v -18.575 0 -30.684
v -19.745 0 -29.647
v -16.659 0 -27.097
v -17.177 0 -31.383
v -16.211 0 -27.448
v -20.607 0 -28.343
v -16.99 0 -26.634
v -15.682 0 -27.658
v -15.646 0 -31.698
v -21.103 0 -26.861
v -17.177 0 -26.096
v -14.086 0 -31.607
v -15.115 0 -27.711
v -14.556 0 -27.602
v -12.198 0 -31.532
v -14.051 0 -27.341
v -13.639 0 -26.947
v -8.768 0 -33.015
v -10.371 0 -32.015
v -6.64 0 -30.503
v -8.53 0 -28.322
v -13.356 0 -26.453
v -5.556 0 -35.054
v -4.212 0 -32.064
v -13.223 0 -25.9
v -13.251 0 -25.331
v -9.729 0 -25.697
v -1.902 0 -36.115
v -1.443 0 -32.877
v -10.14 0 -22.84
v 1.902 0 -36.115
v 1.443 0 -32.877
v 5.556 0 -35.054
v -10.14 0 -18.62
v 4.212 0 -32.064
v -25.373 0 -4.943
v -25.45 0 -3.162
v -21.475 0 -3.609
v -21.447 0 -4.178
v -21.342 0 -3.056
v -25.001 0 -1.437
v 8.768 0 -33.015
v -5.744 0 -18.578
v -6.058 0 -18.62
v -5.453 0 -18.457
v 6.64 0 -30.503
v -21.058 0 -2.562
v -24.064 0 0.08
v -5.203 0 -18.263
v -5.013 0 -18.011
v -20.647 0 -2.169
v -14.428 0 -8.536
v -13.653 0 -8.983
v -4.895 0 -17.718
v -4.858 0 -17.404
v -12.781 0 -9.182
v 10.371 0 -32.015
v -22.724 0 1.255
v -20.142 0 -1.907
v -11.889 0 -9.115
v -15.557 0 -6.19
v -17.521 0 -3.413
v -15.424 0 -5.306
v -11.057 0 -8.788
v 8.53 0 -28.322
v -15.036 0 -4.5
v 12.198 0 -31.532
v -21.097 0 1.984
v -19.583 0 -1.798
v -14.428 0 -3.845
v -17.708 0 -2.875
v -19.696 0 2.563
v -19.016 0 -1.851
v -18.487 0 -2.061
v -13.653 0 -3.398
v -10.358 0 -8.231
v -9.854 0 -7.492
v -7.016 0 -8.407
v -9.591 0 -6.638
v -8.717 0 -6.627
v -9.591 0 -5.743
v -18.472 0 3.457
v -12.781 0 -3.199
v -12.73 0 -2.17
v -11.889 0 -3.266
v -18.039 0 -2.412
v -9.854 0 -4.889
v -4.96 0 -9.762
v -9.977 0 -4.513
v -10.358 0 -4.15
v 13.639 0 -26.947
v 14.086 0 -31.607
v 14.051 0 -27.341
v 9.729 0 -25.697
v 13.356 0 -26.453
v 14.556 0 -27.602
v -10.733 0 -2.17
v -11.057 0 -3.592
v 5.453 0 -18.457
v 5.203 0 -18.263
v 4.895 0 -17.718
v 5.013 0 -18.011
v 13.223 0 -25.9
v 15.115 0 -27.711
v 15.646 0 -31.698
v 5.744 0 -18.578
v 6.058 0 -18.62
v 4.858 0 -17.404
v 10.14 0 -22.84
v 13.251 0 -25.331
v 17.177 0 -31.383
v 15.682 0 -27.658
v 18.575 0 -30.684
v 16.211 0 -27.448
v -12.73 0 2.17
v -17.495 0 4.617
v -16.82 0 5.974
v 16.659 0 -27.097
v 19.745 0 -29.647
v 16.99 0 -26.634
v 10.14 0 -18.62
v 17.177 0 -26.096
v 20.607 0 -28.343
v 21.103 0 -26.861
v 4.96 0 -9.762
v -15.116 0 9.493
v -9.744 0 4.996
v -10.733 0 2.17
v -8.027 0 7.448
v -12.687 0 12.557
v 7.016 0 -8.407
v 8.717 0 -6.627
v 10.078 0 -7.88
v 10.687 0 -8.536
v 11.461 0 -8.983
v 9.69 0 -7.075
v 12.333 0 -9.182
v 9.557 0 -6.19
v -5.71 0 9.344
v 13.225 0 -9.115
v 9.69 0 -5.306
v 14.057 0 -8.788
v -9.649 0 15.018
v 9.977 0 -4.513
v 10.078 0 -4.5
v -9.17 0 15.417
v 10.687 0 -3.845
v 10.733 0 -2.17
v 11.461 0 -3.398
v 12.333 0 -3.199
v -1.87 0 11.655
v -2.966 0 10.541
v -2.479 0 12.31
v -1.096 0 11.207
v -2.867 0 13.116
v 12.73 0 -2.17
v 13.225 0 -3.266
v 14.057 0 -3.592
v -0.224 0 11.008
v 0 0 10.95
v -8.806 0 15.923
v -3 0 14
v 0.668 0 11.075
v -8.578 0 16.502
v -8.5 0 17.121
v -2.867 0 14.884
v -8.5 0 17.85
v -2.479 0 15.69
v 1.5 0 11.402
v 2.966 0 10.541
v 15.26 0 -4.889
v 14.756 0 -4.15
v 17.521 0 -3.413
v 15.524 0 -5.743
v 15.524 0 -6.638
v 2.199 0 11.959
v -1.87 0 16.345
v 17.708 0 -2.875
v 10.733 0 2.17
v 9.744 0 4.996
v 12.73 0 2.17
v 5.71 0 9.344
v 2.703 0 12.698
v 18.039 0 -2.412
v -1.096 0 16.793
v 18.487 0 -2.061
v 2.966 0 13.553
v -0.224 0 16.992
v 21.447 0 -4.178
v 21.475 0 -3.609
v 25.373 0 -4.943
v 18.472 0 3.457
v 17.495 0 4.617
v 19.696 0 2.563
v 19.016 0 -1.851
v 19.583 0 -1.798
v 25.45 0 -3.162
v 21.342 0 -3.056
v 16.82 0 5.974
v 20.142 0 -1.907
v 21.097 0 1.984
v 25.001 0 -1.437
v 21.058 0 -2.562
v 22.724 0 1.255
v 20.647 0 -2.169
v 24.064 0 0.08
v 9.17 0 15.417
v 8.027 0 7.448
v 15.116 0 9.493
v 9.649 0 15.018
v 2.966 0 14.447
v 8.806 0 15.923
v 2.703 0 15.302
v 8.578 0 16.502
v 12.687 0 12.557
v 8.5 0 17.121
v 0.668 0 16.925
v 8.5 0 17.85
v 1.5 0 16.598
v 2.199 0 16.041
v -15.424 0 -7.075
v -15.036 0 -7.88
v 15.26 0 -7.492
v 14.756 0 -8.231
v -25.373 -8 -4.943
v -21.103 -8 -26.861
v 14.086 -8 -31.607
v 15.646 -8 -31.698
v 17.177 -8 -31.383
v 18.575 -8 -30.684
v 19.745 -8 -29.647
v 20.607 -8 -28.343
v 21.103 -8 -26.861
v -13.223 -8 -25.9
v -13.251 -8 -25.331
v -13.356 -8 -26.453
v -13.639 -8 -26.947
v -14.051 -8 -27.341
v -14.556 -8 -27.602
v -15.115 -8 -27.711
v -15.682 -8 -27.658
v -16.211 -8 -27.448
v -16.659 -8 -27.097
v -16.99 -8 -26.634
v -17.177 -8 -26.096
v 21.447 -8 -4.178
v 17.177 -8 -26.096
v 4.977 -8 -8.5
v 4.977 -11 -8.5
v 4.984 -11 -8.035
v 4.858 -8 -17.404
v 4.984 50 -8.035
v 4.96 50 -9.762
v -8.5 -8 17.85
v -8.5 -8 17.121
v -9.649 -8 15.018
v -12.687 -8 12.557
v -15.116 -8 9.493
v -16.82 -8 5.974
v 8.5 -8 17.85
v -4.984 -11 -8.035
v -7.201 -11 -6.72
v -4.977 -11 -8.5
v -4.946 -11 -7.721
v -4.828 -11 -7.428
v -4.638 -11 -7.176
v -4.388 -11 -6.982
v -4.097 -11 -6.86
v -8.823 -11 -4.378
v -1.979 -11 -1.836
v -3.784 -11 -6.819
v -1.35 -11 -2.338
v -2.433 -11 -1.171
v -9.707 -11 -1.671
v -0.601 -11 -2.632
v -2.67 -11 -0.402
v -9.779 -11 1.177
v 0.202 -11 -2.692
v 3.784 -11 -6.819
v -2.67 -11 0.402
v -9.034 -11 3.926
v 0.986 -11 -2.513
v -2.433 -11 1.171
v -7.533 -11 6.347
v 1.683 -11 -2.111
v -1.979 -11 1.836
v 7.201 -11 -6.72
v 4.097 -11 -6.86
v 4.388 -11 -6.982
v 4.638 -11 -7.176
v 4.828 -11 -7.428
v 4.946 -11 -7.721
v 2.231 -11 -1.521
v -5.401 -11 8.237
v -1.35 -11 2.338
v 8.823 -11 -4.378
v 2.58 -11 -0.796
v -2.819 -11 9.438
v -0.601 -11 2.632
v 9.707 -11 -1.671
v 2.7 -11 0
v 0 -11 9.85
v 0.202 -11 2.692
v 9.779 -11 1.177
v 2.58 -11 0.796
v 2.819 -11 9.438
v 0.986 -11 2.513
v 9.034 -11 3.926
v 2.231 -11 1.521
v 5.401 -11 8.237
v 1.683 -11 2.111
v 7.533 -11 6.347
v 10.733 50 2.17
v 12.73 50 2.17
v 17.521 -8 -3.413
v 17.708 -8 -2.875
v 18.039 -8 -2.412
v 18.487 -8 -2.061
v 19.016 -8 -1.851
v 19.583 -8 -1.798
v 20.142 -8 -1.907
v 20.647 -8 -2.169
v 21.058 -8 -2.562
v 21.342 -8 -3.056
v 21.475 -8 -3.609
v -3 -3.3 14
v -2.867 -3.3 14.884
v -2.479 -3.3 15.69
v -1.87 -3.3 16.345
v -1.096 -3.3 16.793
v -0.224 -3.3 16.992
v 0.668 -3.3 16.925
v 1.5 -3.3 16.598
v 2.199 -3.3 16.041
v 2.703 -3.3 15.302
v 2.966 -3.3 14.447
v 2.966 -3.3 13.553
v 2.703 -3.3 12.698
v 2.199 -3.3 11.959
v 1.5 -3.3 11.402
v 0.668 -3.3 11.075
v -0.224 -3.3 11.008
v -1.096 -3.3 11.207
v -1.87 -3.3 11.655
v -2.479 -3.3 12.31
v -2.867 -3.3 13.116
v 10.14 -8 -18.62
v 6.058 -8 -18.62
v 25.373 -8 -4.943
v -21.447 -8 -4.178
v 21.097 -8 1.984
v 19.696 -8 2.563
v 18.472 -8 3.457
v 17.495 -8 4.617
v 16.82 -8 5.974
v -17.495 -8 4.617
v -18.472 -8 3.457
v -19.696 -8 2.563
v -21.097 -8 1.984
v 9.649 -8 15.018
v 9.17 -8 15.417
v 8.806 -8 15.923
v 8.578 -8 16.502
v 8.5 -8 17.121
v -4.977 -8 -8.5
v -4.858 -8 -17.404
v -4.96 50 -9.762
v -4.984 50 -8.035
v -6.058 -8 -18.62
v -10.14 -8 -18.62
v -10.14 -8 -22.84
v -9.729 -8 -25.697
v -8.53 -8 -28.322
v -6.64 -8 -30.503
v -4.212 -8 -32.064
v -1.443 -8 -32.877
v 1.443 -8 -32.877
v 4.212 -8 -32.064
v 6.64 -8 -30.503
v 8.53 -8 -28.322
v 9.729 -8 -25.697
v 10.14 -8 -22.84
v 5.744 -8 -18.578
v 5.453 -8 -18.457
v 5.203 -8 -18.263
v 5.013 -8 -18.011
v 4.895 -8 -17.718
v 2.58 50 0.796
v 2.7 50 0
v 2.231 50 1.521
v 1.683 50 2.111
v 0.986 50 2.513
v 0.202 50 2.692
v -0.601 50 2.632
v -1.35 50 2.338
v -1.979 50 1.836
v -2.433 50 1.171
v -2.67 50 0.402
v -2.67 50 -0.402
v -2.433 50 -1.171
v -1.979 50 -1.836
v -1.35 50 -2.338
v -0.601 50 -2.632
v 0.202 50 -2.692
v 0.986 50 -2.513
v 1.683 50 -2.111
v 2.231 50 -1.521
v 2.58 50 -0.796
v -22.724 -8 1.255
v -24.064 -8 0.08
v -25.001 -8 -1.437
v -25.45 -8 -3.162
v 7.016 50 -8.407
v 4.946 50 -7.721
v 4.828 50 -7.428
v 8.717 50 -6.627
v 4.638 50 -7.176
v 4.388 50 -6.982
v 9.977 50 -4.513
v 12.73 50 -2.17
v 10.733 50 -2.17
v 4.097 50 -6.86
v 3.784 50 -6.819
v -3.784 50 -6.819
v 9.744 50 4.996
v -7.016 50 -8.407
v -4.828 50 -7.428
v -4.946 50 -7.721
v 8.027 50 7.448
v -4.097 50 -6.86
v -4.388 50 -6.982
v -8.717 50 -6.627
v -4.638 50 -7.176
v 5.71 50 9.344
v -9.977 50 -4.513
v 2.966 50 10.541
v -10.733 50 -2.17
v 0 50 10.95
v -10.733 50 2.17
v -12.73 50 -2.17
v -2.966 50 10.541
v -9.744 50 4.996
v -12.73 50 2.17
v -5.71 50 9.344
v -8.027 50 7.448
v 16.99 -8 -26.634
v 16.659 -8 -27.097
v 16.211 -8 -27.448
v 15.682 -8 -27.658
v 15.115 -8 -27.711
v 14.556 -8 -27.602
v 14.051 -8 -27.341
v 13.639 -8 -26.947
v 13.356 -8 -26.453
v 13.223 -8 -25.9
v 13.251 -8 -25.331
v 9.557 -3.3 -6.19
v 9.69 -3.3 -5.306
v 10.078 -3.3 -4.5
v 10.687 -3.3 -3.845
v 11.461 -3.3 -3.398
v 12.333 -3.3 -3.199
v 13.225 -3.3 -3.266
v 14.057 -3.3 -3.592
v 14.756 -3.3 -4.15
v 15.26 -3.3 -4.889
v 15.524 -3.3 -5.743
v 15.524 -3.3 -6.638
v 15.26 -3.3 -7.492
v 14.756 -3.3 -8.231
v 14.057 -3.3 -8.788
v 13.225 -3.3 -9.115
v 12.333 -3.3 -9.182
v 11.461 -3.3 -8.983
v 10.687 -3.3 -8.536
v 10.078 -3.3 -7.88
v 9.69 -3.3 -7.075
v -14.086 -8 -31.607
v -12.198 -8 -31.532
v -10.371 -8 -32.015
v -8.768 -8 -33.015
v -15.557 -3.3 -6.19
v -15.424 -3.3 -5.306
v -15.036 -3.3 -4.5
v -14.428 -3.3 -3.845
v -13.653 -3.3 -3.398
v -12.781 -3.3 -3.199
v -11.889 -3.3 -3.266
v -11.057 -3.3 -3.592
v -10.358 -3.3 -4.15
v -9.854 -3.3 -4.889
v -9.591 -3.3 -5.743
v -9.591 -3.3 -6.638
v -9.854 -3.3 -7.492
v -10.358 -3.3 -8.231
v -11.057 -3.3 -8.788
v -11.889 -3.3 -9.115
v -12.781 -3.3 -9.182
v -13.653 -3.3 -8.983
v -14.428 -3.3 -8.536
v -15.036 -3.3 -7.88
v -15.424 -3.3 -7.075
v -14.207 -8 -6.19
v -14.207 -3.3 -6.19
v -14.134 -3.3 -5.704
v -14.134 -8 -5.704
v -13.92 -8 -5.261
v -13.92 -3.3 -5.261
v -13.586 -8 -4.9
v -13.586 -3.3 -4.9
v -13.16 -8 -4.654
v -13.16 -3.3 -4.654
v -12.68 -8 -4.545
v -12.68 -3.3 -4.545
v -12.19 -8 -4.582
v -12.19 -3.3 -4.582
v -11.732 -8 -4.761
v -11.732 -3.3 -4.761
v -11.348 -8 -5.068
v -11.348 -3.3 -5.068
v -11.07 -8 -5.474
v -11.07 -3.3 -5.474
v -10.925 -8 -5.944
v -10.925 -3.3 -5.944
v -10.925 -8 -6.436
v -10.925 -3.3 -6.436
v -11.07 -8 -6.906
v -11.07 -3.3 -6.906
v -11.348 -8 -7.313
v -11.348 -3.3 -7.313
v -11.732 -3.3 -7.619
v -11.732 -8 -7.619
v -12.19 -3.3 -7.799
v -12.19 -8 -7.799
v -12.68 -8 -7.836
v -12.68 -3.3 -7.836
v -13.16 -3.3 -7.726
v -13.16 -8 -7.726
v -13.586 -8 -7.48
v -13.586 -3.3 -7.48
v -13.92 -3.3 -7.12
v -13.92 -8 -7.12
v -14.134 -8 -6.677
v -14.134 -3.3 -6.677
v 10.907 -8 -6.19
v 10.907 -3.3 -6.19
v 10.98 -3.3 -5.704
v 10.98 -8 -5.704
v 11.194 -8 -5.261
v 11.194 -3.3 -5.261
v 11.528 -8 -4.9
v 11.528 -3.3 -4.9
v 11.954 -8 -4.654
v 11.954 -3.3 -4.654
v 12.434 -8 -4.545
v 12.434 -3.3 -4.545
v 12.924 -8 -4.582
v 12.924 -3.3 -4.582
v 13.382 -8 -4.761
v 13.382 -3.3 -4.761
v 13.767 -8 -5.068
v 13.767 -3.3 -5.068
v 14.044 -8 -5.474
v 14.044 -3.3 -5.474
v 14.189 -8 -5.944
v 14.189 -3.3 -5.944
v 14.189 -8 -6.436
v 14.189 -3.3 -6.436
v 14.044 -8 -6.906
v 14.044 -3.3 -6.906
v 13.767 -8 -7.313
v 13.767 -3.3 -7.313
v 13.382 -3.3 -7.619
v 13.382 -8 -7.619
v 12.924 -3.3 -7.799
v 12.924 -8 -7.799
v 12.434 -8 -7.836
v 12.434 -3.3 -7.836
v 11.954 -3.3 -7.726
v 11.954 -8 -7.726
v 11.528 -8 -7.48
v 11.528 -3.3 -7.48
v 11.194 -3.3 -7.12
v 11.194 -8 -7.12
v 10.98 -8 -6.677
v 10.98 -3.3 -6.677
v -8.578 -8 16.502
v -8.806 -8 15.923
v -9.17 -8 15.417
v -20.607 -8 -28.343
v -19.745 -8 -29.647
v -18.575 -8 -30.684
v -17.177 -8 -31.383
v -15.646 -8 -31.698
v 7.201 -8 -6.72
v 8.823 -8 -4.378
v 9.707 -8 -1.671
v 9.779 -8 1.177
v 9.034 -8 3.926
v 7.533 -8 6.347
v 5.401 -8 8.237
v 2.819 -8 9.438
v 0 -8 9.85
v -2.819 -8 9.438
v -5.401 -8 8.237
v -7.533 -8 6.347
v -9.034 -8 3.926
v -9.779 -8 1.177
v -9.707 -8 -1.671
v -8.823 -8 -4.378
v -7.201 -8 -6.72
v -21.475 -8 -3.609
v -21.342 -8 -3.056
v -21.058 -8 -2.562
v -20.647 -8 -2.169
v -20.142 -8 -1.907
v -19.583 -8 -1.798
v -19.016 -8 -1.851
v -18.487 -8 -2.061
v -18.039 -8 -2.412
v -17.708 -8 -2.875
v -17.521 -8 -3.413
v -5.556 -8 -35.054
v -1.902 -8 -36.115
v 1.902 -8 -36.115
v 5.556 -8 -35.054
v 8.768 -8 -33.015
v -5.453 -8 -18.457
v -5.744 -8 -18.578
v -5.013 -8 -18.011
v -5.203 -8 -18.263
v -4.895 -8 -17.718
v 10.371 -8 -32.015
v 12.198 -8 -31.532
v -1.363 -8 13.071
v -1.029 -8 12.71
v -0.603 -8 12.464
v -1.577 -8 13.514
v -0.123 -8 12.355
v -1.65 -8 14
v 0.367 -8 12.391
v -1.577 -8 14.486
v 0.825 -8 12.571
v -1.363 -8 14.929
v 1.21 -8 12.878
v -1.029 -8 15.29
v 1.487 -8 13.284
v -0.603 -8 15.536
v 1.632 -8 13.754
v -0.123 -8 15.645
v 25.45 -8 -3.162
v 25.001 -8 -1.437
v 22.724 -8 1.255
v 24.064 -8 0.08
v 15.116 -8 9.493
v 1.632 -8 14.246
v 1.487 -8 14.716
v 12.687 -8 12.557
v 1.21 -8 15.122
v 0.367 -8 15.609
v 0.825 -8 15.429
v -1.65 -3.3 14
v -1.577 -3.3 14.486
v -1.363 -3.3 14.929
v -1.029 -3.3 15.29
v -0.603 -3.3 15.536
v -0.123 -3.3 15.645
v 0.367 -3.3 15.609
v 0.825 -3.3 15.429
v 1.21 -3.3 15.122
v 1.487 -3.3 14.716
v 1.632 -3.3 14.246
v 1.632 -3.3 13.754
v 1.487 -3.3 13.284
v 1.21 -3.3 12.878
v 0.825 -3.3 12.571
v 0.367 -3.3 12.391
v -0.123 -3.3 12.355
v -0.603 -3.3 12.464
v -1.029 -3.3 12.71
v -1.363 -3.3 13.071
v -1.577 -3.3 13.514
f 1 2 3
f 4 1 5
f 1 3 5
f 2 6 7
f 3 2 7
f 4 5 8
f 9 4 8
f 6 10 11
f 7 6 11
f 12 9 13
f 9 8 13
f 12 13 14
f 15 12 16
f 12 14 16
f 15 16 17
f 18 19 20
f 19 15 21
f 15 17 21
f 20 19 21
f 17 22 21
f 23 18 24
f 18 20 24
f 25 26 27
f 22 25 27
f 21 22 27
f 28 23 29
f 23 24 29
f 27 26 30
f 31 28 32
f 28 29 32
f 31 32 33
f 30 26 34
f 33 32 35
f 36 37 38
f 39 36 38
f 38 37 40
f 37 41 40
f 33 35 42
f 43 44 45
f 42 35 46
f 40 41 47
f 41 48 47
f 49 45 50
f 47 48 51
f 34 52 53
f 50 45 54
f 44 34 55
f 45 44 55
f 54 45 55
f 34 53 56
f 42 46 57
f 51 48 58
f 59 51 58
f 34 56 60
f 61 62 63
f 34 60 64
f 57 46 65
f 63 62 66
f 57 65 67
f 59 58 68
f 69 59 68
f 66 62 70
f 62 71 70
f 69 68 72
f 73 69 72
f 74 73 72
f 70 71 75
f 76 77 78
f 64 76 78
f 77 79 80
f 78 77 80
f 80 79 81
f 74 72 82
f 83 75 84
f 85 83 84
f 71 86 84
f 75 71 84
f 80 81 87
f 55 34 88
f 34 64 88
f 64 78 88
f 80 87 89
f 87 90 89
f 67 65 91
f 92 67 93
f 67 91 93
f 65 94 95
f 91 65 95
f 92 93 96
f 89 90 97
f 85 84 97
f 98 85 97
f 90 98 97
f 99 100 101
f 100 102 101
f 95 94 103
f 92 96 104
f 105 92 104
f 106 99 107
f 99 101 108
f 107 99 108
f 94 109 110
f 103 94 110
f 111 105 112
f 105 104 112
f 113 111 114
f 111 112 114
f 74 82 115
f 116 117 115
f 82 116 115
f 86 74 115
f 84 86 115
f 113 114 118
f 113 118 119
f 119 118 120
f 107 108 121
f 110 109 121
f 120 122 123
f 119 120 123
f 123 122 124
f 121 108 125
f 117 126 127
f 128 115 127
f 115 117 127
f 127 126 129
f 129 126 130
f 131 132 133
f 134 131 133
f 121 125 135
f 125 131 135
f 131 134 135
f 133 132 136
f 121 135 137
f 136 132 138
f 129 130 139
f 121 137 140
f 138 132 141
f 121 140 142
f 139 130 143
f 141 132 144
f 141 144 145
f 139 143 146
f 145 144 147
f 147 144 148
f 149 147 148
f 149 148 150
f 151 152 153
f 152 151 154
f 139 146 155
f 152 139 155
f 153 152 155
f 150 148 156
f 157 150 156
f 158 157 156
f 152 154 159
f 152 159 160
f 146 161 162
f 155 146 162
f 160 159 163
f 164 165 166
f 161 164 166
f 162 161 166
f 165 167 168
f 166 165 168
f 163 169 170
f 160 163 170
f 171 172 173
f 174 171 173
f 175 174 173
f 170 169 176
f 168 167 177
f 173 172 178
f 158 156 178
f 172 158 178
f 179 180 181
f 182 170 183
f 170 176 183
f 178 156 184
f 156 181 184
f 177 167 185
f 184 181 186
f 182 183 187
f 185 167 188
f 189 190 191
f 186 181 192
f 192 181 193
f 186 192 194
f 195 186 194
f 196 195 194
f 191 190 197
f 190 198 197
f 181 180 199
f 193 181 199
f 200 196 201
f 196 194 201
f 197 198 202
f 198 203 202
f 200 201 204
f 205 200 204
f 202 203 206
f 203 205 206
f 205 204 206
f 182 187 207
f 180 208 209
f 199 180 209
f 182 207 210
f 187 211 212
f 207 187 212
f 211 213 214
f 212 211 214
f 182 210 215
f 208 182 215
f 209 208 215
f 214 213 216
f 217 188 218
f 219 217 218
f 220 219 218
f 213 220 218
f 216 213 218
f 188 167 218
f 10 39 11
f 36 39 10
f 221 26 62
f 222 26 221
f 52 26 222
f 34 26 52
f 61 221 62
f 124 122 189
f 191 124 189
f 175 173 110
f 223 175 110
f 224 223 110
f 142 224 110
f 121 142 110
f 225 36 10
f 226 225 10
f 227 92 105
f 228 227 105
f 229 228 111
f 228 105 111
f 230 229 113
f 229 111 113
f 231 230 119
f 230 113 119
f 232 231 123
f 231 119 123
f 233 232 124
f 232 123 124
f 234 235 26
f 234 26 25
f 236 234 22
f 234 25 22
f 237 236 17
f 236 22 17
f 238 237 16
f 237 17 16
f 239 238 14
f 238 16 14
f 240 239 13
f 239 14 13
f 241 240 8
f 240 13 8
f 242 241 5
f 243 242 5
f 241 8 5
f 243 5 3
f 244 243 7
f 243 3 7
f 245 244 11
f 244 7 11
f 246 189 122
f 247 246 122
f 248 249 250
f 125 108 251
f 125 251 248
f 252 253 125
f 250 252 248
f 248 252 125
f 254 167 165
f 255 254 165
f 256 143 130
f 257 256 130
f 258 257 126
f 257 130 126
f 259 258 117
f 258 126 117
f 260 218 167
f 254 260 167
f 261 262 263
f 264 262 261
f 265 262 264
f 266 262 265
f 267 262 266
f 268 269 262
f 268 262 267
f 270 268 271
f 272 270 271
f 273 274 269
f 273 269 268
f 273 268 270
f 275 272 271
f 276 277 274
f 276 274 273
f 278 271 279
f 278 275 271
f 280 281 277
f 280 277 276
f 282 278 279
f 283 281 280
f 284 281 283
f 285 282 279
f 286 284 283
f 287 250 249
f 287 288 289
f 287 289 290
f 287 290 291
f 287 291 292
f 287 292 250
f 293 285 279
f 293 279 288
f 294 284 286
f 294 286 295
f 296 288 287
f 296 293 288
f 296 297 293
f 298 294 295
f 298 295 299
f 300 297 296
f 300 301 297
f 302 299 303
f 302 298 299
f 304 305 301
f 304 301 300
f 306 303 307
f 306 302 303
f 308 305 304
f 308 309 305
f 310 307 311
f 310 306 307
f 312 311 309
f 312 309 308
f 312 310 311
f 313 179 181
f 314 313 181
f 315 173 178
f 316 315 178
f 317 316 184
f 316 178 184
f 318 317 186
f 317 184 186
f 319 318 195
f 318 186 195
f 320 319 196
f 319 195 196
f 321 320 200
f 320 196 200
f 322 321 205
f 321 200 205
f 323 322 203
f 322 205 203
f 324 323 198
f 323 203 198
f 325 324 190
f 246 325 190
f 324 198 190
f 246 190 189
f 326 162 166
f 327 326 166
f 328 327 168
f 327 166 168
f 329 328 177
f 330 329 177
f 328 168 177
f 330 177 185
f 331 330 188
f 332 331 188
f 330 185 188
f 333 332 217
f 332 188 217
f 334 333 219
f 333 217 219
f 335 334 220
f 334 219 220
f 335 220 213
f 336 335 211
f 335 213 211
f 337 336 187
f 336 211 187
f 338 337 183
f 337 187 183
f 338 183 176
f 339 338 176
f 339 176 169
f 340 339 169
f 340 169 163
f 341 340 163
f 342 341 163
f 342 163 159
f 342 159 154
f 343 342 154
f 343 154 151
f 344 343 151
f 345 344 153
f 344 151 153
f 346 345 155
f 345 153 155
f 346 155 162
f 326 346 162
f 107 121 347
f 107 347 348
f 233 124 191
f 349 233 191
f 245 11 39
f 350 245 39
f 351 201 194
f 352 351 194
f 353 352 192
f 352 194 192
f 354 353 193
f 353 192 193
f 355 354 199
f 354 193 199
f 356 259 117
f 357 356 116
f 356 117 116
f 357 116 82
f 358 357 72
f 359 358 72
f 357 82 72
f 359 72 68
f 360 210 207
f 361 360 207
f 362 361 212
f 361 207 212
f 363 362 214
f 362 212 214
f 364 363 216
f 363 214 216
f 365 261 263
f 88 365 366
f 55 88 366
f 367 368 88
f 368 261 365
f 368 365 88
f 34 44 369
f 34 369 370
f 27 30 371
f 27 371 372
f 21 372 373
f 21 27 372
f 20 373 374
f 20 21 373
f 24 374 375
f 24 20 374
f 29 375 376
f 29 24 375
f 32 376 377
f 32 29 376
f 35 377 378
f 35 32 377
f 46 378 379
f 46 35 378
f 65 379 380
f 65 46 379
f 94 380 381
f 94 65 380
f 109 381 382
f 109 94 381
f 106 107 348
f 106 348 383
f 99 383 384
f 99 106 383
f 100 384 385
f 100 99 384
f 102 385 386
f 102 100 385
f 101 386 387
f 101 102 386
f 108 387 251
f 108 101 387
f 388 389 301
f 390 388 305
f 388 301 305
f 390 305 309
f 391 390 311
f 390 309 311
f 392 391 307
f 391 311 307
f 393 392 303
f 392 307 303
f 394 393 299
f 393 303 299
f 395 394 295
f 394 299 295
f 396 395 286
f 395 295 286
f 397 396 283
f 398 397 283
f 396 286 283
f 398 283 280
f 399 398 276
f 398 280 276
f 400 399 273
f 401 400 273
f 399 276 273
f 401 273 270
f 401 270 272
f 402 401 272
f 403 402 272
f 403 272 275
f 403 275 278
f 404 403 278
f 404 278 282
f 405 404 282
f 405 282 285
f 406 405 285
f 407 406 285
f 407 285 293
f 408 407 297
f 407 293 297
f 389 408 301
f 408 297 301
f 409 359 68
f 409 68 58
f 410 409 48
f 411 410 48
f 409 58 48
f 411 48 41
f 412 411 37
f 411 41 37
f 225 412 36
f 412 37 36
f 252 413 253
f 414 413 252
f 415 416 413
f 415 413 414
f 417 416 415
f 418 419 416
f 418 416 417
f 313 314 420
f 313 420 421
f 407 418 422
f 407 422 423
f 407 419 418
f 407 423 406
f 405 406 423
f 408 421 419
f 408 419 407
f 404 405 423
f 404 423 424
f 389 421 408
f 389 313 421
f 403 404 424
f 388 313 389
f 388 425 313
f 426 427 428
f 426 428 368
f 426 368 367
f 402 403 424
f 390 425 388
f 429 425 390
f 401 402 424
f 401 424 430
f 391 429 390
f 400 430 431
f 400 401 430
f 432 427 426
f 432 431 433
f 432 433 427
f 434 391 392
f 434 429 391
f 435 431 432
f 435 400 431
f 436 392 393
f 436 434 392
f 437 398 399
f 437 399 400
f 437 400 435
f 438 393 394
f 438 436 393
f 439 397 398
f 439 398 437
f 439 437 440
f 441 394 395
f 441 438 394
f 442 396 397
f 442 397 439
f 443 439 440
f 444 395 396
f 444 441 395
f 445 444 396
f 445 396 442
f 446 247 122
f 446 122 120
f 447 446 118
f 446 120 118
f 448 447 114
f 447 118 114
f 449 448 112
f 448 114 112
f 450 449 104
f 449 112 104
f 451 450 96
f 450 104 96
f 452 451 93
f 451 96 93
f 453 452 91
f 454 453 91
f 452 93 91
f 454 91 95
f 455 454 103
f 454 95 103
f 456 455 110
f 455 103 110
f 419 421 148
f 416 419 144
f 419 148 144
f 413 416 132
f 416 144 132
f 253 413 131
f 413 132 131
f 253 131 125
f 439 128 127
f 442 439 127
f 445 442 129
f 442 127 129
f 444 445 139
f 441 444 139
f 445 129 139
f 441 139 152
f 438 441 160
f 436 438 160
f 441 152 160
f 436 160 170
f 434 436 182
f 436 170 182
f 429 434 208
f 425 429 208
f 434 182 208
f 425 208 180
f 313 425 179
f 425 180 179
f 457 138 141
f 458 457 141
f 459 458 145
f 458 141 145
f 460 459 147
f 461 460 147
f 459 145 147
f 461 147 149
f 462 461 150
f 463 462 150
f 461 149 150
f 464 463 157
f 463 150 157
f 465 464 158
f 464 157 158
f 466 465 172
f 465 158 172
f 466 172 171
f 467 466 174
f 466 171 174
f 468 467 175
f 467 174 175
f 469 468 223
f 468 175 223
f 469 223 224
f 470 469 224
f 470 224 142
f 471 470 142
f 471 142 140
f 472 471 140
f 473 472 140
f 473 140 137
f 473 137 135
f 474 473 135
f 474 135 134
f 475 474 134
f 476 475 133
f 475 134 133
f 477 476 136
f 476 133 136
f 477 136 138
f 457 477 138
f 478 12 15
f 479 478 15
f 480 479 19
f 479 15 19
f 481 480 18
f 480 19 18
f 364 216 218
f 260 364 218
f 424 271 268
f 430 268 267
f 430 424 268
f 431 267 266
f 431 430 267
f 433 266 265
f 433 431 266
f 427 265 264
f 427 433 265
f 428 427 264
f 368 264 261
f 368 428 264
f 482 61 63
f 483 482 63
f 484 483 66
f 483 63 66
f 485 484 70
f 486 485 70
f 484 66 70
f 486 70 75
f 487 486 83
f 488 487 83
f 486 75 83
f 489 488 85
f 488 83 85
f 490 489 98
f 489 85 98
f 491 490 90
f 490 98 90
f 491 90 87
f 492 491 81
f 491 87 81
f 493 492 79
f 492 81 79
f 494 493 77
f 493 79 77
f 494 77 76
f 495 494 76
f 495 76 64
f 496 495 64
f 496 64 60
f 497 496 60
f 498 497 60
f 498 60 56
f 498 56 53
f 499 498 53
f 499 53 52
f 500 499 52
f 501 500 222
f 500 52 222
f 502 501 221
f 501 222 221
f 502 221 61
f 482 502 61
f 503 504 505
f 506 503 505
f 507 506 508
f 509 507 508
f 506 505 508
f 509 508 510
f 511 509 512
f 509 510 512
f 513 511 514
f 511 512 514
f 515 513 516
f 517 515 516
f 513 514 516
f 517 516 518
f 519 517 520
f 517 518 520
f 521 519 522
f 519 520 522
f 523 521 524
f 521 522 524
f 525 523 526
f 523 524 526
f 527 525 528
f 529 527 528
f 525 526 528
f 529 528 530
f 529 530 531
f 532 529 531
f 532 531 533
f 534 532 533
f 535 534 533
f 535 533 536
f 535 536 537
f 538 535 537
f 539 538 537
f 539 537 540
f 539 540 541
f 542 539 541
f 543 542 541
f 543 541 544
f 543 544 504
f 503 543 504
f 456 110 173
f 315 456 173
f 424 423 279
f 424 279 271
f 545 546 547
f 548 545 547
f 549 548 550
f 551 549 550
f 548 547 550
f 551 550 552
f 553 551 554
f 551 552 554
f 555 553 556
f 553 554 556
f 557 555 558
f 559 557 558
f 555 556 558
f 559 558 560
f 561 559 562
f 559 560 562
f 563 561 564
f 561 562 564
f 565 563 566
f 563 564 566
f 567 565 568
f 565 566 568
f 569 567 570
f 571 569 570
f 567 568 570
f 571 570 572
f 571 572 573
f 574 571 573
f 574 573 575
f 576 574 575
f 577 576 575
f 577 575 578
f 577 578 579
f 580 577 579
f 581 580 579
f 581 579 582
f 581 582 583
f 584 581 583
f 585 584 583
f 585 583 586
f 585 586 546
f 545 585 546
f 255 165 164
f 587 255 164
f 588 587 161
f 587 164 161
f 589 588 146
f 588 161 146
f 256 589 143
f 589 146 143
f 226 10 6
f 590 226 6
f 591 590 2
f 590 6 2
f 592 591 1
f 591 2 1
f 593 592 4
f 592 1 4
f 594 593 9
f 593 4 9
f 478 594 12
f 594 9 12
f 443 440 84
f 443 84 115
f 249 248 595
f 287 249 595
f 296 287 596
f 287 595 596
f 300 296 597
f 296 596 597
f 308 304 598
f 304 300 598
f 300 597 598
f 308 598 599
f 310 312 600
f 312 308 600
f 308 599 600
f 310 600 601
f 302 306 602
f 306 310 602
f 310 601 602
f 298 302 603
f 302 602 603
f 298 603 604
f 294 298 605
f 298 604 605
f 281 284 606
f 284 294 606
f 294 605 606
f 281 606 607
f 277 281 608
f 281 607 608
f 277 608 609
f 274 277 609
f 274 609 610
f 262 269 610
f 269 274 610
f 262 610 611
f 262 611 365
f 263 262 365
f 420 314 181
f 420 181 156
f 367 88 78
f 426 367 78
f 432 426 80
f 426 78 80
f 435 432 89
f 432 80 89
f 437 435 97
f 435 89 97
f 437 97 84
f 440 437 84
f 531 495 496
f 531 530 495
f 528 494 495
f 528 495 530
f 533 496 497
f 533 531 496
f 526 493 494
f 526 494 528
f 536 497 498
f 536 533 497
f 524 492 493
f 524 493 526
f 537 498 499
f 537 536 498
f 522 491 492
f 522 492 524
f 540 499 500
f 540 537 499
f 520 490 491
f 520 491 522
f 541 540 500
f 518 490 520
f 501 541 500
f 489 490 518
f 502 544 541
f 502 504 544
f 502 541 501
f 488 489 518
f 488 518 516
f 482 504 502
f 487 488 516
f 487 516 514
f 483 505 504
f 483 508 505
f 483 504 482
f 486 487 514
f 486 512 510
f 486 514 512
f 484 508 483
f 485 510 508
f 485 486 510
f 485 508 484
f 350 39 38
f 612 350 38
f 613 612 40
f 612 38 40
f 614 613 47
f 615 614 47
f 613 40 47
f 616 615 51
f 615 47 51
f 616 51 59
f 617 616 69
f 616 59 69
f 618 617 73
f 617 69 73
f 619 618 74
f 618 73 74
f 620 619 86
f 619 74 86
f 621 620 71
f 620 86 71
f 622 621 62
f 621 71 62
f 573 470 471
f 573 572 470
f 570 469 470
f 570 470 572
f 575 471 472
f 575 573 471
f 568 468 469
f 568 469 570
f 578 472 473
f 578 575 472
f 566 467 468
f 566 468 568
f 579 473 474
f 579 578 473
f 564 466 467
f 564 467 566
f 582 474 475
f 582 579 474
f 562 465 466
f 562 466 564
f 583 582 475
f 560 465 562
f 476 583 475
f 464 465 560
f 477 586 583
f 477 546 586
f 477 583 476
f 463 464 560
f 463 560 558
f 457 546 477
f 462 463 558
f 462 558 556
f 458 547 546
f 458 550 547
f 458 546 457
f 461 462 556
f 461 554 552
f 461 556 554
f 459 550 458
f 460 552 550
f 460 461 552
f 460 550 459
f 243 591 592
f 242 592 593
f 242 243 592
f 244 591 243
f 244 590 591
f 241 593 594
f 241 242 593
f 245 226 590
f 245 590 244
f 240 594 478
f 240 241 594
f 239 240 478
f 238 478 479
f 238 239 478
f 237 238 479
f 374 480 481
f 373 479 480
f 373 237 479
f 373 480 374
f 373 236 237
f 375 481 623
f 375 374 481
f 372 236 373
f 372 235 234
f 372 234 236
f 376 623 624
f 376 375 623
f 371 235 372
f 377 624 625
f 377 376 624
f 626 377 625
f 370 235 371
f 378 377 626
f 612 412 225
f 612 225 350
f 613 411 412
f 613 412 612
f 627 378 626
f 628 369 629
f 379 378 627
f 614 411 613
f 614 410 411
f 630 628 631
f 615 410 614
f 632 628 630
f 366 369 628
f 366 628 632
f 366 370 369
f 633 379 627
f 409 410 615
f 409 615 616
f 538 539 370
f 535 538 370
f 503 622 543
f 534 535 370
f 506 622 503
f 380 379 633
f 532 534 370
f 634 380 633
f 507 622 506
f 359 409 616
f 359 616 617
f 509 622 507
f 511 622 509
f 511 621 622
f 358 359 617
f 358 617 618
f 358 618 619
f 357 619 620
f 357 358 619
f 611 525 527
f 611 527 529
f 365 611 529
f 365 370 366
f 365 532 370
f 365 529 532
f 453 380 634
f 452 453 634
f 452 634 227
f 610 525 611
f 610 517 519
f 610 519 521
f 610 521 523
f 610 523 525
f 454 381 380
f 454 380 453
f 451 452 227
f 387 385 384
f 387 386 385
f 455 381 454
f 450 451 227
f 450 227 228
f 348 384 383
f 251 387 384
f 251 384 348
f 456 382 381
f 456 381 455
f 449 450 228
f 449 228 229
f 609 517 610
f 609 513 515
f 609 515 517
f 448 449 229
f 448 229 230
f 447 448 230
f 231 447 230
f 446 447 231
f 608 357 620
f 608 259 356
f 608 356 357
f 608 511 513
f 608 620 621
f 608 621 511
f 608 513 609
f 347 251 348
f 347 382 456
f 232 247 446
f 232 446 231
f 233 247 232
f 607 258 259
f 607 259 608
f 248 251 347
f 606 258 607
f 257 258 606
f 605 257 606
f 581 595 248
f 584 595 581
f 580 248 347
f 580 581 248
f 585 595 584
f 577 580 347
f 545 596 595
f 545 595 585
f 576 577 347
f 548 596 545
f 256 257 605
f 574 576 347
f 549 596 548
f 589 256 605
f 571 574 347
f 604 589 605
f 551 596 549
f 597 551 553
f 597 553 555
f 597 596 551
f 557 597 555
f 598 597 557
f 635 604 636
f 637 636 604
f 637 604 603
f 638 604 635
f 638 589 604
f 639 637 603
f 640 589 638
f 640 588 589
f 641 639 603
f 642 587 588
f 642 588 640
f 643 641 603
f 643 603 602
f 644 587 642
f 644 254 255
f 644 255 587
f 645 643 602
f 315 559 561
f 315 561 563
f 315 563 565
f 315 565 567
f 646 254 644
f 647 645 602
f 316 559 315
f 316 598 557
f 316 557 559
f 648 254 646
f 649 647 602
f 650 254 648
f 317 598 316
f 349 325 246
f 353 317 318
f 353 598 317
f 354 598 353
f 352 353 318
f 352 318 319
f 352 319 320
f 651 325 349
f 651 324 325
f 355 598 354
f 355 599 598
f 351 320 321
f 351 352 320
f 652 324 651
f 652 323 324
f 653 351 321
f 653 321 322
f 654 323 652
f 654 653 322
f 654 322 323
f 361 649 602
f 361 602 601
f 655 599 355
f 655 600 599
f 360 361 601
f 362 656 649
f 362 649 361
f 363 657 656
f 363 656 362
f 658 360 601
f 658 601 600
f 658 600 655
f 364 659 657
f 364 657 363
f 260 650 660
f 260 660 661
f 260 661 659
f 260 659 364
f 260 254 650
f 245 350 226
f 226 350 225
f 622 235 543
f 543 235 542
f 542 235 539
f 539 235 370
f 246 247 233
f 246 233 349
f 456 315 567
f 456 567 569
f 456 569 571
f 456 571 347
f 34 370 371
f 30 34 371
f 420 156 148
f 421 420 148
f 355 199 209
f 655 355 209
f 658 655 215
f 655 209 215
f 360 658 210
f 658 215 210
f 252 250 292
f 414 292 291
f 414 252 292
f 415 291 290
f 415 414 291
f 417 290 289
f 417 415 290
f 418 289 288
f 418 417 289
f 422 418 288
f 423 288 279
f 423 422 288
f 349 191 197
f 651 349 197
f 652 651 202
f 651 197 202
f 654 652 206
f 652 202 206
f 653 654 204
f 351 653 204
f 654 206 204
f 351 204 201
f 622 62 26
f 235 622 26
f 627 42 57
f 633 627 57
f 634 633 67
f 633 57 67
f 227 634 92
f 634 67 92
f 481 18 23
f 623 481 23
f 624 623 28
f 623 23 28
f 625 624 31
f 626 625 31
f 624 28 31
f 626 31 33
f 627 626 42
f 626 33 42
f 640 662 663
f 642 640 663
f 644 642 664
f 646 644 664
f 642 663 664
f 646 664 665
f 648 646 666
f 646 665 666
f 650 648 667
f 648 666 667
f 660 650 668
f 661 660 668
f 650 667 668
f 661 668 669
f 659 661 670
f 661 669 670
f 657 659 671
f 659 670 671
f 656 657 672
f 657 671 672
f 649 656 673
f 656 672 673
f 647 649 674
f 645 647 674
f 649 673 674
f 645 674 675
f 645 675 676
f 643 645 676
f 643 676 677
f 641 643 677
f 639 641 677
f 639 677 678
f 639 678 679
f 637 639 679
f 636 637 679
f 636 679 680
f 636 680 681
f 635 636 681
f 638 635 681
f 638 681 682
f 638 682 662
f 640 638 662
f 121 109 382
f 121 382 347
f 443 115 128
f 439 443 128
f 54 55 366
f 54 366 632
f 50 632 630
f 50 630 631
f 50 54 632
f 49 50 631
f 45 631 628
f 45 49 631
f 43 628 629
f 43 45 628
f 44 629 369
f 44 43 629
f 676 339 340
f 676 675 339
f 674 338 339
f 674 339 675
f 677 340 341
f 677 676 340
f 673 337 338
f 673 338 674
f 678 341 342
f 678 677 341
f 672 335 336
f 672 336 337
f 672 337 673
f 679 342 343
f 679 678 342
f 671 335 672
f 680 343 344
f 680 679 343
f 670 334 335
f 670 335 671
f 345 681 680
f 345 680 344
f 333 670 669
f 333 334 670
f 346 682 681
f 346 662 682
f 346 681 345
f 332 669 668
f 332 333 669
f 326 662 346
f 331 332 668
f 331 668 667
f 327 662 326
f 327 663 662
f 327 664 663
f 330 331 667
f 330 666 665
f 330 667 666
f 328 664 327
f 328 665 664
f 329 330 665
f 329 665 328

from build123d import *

# Parameters (mm, degrees)
F1_DEPTH  = 8
F2_R      = 9.85
F3_DEPTH  = 3
F5_DEPTH  = 50
F6_R      = 2.7
F7_DEPTH  = 61
F8_R      = 3
F8_R_2    = 1.65
F9_DEPTH  = 3.3
F10_DEPTH = 25
F11_DEPTH = 25
F12_DEPTH = 25
F15_DEPTH = 61.001


with BuildPart() as f1:
    # F0 (on Front) → F1 (new body)
    with BuildSketch(Plane.XZ):
        with BuildLine():
            ThreePointArc((21.0969540743, 1.9835702793), (18.4718439184, 3.4572581024), (16.8204946757, 5.9744002934))
            ThreePointArc((16.8204946757, 5.9744002934), (13.9856503791, 11.0916222201), (9.6486486486, 15.0175257368))
            ThreePointArc((9.6486486486, 15.0175257368), (8.805873935, 15.9225674247), (8.5, 17.1208206579))
            Line((8.5, 17.1208206579), (8.5, 17.85))
            Line((8.5, 17.85), (0, 17.85))
            Line((0, 17.85), (-8.5, 17.85))
            Line((-8.5, 17.85), (-8.5, 17.1208206579))
            ThreePointArc((-8.5, 17.1208206579), (-8.805873935, 15.9225674247), (-9.6486486486, 15.0175257368))
            ThreePointArc((-9.6486486486, 15.0175257368), (-13.9856503791, 11.0916222201), (-16.8204946757, 5.9744002934))
            ThreePointArc((-16.8204946757, 5.9744002934), (-18.4718439184, 3.4572581024), (-21.0969540743, 1.9835702793))
            ThreePointArc((-21.0969540743, 1.9835702793), (-24.5891766283, -0.6435628298), (-25.3730516414, -4.9427472527))
            Line((-25.3730516414, -4.9427472527), (-21.10331181, -26.860989011))
            ThreePointArc((-21.10331181, -26.860989011), (-18.5752648191, -30.6838472237), (-14.0859973304, -31.6067469569))
            ThreePointArc((-14.0859973304, -31.6067469569), (-11.2665542119, -31.7051253732), (-8.7679800751, -33.0151120502))
            ThreePointArc((-8.7679800751, -33.0151120502), (0, -36.25), (8.7679800751, -33.0151120502))
            ThreePointArc((8.7679800751, -33.0151120502), (11.2665542119, -31.7051253732), (14.0859973304, -31.6067469569))
            ThreePointArc((14.0859973304, -31.6067469569), (18.5752648191, -30.6838472237), (21.10331181, -26.860989011))
            Line((21.10331181, -26.860989011), (25.3730516414, -4.9427472527))
            ThreePointArc((25.3730516414, -4.9427472527), (24.5891766283, -0.6435628298), (21.0969540743, 1.9835702793))
        make_face()
        with BuildLine():
            ThreePointArc((-21.4468540953, -4.1779120879), (-19.8661729047, -1.8323957325), (-17.5206565493, -3.4130769231))
            Line((-17.5206565493, -3.4130769231), (-13.2509167179, -25.3313186813))
            ThreePointArc((-13.2509167179, -25.3313186813), (-14.8315979085, -27.6768350368), (-17.177114264, -26.0961538462))
            Line((-17.177114264, -26.0961538462), (-21.4468540953, -4.1779120879))
        make_face(mode=Mode.SUBTRACT)
        with BuildLine():
            ThreePointArc((17.177114264, -26.0961538462), (14.8315979085, -27.6768350368), (13.2509167179, -25.3313186813))
            Line((13.2509167179, -25.3313186813), (17.5206565493, -3.4130769231))
            ThreePointArc((17.5206565493, -3.4130769231), (19.8661729047, -1.8323957325), (21.4468540953, -4.1779120879))
            Line((21.4468540953, -4.1779120879), (17.177114264, -26.0961538462))
        make_face(mode=Mode.SUBTRACT)
    extrude(amount=F1_DEPTH)

    # F2 (on face) → F3 (join)
    with BuildSketch(Plane.XZ.offset(8)):
        Circle(F2_R)
    extrude(amount=F3_DEPTH)

    # F4 (on face) → F5 (join)
    with BuildSketch(Plane(origin=(0, 0, 0), x_dir=(-1, 0, 0), z_dir=(0, 1, 0))):
        with BuildLine():
            Line((-12.73, -2.17), (-10.7328281455, -2.17))
            ThreePointArc((-10.7328281455, -2.17), (0, -10.95), (10.7328281455, -2.17))
            Line((10.7328281455, -2.17), (12.73, -2.17))
            Line((12.73, -2.17), (12.73, 2.17))
            Line((12.73, 2.17), (10.7328281455, 2.17))
            ThreePointArc((10.7328281455, 2.17), (0, 10.95), (-10.7328281455, 2.17))
            Line((-10.7328281455, 2.17), (-12.73, 2.17))
            Line((-12.73, 2.17), (-12.73, -2.17))
        make_face()
    extrude(amount=F5_DEPTH)

    # F6 (on face) → F7 (cut, through all)
    with BuildSketch(Plane.XZ.offset(11)):
        Circle(F6_R)
    extrude(amount=-F7_DEPTH, mode=Mode.SUBTRACT)

    # F8 (on face) → F9 (cut)
    with BuildSketch(Plane(origin=(0, 0, 0), x_dir=(-1, 0, 0), z_dir=(0, 1, 0))):
        with Locations((0, 14)):
            Circle(F8_R)
        with Locations((0, 14)):
            Circle(F8_R_2, mode=Mode.SUBTRACT)
        with Locations((-12.5570375793, -6.1903802172)):
            Circle(F8_R)
        with Locations((-12.5570375793, -6.1903802172)):
            Circle(F8_R_2, mode=Mode.SUBTRACT)
        with Locations((12.5570375793, -6.1903802172)):
            Circle(F8_R)
        with Locations((12.5570375793, -6.1903802172)):
            Circle(F8_R_2, mode=Mode.SUBTRACT)
    extrude(amount=-F9_DEPTH, mode=Mode.SUBTRACT)

    # F10 (cut): a face of the model
    f10_faces = [f1.faces().sort_by_distance(p)[0] for p in [
        (-12.5570375793, 0, -6.1903802172),
    ]]
    extrude(f10_faces, amount=-F10_DEPTH, mode=Mode.SUBTRACT)

    # F11 (cut): a face of the model
    f11_faces = [f1.faces().sort_by_distance(p)[0] for p in [
        (0, 0, 14),
    ]]
    extrude(f11_faces, amount=-F11_DEPTH, mode=Mode.SUBTRACT)

    # F12 (cut): a face of the model
    f12_faces = [f1.faces().sort_by_distance(p)[0] for p in [
        (12.5570375793, 0, -6.1903802172),
    ]]
    extrude(f12_faces, amount=-F12_DEPTH, mode=Mode.SUBTRACT)

    # F14 (on offset) → F15 (cut, through all)
    with BuildSketch(Plane.XZ.offset(-50)):
        with BuildLine():
            ThreePointArc((-4.8577252987, -17.4038723234), (-5.2034058164, -18.2628068545), (-6.057616918, -18.62))
            Line((-6.057616918, -18.62), (-10.14, -18.62))
            Line((-10.14, -18.62), (-10.14, -22.84))
            ThreePointArc((-10.14, -22.84), (0, -32.98), (10.14, -22.84))
            Line((10.14, -22.84), (10.14, -18.62))
            Line((10.14, -18.62), (6.057616918, -18.62))
            ThreePointArc((6.057616918, -18.62), (5.2034058164, -18.2628068545), (4.8577252987, -17.4038723234))
            Line((4.8577252987, -17.4038723234), (4.9836540955, -8.0348285577))
            ThreePointArc((4.9836540955, -8.0348285577), (4.6379735777, -7.1758940266), (3.7837624762, -6.8187008811))
            Line((3.7837624762, -6.8187008811), (0, -6.8187008811))
            Line((0, -6.8187008811), (-3.7837624762, -6.8187008811))
            ThreePointArc((-3.7837624762, -6.8187008811), (-4.6379735777, -7.1758940266), (-4.9836540955, -8.0348285577))
            Line((-4.9836540955, -8.0348285577), (-4.8577252987, -17.4038723234))
        make_face()
    extrude(amount=F15_DEPTH, mode=Mode.SUBTRACT)


solid = f1.part
